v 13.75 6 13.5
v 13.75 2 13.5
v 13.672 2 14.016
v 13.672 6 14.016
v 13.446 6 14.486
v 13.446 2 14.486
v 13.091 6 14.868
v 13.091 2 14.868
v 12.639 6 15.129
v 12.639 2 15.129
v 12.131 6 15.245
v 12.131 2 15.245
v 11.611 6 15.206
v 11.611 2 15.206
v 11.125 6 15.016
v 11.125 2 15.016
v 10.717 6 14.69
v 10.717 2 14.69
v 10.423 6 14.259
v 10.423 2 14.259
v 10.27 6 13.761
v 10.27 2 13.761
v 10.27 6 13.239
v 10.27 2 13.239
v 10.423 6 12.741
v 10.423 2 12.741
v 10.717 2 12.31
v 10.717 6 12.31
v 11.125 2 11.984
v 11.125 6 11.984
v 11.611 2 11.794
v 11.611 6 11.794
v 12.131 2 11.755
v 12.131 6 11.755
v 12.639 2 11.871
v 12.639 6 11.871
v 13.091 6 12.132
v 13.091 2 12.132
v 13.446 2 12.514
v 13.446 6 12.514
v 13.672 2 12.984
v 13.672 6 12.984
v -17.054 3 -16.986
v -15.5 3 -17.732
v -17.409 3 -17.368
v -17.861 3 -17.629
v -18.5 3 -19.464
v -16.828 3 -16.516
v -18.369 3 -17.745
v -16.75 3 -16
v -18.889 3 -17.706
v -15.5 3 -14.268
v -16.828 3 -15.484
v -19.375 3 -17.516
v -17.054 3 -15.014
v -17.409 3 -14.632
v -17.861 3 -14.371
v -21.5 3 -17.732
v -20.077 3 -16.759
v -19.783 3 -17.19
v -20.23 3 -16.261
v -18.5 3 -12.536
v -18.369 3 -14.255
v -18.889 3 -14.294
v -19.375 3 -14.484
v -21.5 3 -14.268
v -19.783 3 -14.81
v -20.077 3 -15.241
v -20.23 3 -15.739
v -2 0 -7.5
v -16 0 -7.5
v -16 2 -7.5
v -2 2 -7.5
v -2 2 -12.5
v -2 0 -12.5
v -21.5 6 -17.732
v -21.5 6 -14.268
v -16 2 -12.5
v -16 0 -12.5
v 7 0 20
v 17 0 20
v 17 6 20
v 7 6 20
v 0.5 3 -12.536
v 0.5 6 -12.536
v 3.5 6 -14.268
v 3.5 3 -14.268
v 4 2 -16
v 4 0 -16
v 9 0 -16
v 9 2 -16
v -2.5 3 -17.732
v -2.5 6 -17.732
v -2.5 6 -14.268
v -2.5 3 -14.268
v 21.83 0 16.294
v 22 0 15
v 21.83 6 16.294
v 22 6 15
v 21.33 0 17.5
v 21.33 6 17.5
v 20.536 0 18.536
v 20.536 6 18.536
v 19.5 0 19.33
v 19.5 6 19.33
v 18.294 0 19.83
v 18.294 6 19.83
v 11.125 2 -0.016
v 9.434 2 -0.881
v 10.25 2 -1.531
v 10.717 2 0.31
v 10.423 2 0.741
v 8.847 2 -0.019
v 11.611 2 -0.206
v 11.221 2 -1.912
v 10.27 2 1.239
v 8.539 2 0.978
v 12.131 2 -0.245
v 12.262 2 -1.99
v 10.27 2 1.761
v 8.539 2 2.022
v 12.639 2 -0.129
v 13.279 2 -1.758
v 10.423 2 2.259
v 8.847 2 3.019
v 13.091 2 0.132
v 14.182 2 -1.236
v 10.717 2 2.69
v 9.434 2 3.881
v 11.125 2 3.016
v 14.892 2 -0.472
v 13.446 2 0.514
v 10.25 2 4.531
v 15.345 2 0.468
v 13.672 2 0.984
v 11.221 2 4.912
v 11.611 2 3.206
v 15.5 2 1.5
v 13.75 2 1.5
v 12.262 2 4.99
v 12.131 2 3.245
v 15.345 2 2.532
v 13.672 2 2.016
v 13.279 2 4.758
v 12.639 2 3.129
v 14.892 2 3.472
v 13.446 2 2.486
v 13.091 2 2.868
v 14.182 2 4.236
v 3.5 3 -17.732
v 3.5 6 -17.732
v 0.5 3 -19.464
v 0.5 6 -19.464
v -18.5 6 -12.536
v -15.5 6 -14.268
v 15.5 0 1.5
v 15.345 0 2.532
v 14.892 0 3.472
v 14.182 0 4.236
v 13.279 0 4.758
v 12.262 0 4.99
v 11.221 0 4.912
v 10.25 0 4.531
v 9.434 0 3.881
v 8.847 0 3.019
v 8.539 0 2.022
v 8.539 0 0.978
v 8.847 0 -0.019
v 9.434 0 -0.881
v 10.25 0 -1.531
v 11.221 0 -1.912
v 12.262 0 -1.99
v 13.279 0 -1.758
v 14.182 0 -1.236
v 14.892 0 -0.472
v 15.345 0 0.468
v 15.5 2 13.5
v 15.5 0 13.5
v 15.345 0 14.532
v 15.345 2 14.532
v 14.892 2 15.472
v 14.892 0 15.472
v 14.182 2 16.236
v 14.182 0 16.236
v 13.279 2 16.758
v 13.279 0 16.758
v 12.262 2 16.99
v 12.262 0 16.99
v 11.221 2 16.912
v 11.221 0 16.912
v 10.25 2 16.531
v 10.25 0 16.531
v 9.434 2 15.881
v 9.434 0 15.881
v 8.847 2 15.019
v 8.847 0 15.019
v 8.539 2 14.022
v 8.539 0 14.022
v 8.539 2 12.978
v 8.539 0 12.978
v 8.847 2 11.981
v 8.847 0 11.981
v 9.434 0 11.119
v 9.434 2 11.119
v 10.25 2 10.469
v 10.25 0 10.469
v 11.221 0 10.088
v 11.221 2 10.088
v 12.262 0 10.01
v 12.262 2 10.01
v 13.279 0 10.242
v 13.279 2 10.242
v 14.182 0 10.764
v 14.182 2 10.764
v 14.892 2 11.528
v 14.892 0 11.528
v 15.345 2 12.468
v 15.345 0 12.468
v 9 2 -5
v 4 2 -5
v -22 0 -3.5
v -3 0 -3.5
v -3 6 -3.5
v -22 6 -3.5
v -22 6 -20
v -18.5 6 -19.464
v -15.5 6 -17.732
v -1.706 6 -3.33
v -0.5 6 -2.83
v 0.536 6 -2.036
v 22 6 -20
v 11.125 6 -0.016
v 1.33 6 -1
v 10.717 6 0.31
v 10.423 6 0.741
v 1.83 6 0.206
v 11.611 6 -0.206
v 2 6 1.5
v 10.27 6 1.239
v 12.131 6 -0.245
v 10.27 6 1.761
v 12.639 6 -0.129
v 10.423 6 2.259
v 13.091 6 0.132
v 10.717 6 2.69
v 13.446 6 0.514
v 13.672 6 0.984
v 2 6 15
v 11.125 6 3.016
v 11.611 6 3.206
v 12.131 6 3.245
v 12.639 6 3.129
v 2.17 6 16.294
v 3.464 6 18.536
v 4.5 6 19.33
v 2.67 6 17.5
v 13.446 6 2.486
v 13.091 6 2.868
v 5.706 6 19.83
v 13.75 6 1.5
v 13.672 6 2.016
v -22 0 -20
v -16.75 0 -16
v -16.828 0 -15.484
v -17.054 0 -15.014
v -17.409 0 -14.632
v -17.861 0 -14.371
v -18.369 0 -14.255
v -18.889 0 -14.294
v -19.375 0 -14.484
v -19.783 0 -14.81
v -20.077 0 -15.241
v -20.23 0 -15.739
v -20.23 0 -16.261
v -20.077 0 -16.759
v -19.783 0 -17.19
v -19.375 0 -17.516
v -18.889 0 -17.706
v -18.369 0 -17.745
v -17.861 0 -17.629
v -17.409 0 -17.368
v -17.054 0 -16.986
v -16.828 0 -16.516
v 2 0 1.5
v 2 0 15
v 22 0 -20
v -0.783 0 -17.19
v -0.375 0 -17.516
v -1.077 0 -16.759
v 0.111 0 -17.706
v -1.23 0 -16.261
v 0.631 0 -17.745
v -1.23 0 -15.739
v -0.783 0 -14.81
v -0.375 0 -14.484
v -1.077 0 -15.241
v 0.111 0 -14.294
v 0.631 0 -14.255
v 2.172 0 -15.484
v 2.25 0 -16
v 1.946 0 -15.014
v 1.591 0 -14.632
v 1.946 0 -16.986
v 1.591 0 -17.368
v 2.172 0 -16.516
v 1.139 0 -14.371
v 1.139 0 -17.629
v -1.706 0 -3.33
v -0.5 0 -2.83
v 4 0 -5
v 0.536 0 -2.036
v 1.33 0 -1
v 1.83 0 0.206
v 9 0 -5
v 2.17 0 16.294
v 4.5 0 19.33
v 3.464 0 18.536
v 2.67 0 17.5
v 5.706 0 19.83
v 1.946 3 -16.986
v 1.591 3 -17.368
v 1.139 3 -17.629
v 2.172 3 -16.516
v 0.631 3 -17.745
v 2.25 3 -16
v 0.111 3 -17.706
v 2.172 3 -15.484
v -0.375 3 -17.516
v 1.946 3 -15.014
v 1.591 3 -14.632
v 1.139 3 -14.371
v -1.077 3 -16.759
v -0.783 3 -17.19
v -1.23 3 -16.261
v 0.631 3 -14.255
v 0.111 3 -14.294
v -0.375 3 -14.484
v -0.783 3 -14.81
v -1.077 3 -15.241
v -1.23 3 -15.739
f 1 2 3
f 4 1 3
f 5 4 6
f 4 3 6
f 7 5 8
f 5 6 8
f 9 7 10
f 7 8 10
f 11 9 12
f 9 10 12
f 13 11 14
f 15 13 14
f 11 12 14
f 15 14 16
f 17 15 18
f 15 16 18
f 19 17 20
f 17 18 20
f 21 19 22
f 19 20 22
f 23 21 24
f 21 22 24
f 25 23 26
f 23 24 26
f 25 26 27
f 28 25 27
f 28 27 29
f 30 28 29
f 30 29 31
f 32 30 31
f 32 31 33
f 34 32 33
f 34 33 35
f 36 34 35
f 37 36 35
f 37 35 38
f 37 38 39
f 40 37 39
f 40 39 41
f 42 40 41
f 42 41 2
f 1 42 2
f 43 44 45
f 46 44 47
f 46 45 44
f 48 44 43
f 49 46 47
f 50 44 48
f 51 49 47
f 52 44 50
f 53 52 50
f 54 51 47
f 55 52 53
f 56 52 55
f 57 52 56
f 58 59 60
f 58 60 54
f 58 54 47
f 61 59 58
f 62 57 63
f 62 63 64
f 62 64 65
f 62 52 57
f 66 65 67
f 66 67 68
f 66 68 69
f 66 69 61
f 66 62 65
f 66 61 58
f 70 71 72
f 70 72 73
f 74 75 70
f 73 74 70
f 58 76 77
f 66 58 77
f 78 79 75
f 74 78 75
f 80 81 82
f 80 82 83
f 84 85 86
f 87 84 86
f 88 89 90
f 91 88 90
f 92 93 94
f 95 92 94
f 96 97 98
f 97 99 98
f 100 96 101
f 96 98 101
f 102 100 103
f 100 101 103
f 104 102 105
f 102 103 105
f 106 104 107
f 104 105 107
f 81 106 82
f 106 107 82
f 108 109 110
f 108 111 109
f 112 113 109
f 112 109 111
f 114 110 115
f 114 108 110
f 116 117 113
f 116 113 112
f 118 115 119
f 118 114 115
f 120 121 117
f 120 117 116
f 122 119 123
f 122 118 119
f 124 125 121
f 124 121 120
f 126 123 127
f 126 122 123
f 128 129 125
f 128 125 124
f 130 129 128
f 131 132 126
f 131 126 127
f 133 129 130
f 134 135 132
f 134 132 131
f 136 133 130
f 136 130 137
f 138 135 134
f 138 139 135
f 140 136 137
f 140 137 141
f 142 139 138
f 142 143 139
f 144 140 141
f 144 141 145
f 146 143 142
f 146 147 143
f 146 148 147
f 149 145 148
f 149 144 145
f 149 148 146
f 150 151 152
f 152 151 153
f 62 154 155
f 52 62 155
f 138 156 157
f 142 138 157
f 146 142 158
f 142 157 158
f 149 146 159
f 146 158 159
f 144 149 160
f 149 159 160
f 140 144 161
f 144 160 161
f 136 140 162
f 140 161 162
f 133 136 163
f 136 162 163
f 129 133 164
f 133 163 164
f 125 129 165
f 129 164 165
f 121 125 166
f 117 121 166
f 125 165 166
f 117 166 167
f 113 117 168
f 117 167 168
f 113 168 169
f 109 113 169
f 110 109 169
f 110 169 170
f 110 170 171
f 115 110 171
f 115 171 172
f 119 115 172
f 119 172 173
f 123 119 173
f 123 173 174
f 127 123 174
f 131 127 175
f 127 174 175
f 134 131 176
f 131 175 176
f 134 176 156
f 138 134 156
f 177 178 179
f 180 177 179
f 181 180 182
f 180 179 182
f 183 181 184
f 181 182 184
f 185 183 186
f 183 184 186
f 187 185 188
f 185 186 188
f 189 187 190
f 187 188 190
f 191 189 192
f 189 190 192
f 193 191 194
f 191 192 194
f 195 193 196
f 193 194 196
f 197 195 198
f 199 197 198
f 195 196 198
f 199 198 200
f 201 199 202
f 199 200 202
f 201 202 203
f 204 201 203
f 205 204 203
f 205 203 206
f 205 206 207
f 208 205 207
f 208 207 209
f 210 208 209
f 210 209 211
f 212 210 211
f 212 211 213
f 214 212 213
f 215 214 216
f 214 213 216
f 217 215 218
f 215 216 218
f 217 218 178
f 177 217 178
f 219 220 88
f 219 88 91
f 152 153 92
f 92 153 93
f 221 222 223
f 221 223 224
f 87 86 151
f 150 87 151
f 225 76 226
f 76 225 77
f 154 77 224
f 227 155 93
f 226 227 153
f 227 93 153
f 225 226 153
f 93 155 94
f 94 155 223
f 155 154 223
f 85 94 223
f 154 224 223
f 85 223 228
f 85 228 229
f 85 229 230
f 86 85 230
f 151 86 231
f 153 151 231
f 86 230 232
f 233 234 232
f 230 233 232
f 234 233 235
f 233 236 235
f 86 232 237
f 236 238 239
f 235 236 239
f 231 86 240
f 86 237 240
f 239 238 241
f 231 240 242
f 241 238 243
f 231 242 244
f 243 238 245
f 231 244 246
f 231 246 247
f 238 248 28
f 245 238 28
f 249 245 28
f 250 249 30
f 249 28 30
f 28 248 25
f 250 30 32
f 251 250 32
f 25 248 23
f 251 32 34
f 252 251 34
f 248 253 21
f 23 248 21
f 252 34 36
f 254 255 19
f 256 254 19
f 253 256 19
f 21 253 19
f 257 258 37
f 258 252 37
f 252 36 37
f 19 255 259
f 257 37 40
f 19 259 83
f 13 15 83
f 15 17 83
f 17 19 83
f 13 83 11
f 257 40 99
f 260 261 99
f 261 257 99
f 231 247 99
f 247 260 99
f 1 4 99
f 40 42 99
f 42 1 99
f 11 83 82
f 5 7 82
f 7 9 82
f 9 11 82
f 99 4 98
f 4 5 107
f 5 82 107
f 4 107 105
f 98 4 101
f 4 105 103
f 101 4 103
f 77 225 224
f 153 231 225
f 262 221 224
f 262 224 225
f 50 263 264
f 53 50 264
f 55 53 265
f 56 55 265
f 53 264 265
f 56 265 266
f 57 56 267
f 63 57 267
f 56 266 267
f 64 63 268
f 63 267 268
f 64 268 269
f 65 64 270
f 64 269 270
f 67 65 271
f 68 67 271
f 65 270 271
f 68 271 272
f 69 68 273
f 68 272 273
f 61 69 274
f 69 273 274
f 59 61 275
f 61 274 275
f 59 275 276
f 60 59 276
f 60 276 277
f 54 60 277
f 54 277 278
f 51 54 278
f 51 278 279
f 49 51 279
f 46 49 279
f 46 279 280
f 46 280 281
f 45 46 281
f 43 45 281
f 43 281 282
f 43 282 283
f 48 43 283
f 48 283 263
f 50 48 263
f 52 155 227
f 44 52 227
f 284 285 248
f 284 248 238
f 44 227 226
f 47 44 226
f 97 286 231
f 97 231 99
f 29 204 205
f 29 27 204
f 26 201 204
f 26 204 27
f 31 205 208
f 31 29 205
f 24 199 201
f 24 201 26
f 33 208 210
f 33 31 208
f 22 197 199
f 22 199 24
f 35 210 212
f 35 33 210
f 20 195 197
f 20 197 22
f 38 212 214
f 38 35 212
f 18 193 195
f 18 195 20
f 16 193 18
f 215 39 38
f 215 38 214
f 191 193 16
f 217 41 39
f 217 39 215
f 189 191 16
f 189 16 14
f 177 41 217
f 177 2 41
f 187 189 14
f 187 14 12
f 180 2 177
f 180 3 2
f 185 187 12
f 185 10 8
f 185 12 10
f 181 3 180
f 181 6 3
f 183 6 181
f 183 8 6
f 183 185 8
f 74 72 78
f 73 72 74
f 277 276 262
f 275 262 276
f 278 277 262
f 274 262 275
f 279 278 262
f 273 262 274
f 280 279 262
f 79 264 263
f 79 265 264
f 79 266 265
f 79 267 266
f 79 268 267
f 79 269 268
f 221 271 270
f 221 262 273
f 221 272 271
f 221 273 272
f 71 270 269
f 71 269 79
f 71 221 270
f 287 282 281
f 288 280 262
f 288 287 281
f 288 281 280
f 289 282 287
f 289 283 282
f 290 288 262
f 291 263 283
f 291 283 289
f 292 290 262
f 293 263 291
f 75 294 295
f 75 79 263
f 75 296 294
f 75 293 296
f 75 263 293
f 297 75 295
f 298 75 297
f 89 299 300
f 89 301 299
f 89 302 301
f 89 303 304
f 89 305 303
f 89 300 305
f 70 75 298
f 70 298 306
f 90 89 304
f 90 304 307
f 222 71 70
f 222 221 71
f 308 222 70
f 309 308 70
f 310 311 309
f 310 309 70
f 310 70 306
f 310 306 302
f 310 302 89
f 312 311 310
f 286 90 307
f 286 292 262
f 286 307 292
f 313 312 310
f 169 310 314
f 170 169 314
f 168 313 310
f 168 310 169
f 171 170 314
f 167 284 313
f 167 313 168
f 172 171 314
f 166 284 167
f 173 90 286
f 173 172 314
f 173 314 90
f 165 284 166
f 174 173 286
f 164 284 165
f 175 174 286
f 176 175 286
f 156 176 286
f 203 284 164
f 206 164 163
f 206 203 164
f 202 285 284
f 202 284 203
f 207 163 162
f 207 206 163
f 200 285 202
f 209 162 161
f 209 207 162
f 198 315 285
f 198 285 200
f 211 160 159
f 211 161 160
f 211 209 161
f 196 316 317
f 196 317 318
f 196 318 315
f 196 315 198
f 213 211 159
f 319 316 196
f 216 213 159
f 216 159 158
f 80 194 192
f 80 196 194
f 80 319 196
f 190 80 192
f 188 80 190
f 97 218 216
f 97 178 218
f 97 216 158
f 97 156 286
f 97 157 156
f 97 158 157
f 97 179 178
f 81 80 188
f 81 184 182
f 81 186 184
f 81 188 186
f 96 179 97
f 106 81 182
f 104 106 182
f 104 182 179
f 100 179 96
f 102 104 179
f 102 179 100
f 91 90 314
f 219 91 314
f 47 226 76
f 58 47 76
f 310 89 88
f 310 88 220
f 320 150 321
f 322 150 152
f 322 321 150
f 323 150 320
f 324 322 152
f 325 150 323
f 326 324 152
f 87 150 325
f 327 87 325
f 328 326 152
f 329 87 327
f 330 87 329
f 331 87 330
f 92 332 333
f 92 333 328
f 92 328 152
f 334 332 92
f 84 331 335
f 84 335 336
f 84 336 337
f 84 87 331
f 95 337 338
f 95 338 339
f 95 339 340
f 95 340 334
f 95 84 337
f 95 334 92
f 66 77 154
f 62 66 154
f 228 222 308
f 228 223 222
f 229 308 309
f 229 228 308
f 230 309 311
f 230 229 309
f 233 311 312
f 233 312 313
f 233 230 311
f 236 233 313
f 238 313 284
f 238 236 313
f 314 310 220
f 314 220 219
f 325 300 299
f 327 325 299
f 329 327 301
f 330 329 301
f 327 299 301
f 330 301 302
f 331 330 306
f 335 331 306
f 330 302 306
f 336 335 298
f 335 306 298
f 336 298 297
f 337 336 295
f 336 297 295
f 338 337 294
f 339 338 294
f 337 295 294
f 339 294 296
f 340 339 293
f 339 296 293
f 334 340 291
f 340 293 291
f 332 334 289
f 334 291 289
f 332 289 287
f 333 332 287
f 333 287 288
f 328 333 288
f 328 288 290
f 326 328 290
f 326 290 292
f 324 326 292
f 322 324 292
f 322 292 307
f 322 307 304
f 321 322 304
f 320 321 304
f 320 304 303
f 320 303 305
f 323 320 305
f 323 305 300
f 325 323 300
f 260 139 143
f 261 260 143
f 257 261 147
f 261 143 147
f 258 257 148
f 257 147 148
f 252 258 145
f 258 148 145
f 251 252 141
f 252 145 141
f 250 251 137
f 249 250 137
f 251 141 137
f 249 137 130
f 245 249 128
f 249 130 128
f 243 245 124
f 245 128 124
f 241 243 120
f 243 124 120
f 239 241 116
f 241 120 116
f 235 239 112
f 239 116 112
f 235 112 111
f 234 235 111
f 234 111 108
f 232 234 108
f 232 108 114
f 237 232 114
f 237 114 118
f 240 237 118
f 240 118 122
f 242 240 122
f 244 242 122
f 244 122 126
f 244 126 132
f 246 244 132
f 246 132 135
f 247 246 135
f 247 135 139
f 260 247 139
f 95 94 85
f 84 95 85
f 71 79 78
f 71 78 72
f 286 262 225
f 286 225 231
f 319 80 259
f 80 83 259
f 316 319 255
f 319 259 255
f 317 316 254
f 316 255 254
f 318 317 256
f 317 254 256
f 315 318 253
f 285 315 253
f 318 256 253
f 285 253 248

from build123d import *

# Parameters (mm, degrees)
F0_R     = 1.75
F0_W     = 14
F0_H     = 5
F0_W_2   = 5
F0_H_2   = 11
F0_R_2   = 3.5
F1_DEPTH = 6
F2_DEPTH = 2
F4_DEPTH = 3
F5_R     = 5


with BuildPart() as f1:
    # F0 (on Front) → F1 (new body)
    with BuildSketch(Plane.XZ):
        Polygon((-22, -20), (22, -20), (22, 20), (2, 20), (2, -3.5), (-22, -3.5), align=None)
        with Locations((-18.5, -16)):
            Circle(F0_R, mode=Mode.SUBTRACT)
        with Locations((-9, -10)):
            Rectangle(F0_W, F0_H, mode=Mode.SUBTRACT)
        with Locations((0.5, -16)):
            Circle(F0_R, mode=Mode.SUBTRACT)
        with Locations((6.5, -10.5)):
            Rectangle(F0_W_2, F0_H_2, mode=Mode.SUBTRACT)
        with Locations((12, 1.5)):
            Circle(F0_R_2, mode=Mode.SUBTRACT)
        with Locations((12, 13.5)):
            Circle(F0_R_2, mode=Mode.SUBTRACT)
        with Locations((-9, -10)):
            Rectangle(F0_W, F0_H)
        with Locations((6.5, -10.5)):
            Rectangle(F0_W_2, F0_H_2)
        with Locations((12, 1.5)):
            Circle(F0_R_2)
        with Locations((12, 1.5)):
            Circle(F0_R, mode=Mode.SUBTRACT)
        with Locations((12, 13.5)):
            Circle(F0_R_2)
        with Locations((12, 13.5)):
            Circle(F0_R, mode=Mode.SUBTRACT)
    extrude(amount=-F1_DEPTH)

    # F0 (on Front) → F2 (cut)
    with BuildSketch(Plane.XZ):
        with Locations((6.5, -10.5)):
            Rectangle(F0_W_2, F0_H_2)
        with Locations((-9, -10)):
            Rectangle(F0_W, F0_H)
        with Locations((12, 13.5)):
            Circle(F0_R_2)
        with Locations((12, 13.5)):
            Circle(F0_R, mode=Mode.SUBTRACT)
        with Locations((12, 1.5)):
            Circle(F0_R_2)
        with Locations((12, 1.5)):
            Circle(F0_R, mode=Mode.SUBTRACT)
    extrude(amount=-F2_DEPTH, mode=Mode.SUBTRACT)

    # F3 (on face) → F4 (cut)
    with BuildSketch(Plane(origin=(0, 6, 0), x_dir=(-1, 0, 0), z_dir=(0, 1, 0))):
        Polygon((-0.5, -12.535898), (-3.5, -14.267949), (-3.5, -17.732051), (-0.5, -19.464102), (2.5, -17.732051), (2.5, -14.267949), align=None)
        Polygon((15.5, -14.267949), (15.5, -17.732051), (18.5, -19.464102), (21.5, -17.732051), (21.5, -14.267949), (18.5, -12.535898), align=None)
    extrude(amount=-F4_DEPTH, mode=Mode.SUBTRACT)

    # F5
    f5_edges = [f1.edges().sort_by_distance(p)[0] for p in [
        (2, 3, -3.5),
        (2, 3, 20),
        (22, 3, 20),
    ]]
    fillet(f5_edges, radius=F5_R)


solid = f1.part
